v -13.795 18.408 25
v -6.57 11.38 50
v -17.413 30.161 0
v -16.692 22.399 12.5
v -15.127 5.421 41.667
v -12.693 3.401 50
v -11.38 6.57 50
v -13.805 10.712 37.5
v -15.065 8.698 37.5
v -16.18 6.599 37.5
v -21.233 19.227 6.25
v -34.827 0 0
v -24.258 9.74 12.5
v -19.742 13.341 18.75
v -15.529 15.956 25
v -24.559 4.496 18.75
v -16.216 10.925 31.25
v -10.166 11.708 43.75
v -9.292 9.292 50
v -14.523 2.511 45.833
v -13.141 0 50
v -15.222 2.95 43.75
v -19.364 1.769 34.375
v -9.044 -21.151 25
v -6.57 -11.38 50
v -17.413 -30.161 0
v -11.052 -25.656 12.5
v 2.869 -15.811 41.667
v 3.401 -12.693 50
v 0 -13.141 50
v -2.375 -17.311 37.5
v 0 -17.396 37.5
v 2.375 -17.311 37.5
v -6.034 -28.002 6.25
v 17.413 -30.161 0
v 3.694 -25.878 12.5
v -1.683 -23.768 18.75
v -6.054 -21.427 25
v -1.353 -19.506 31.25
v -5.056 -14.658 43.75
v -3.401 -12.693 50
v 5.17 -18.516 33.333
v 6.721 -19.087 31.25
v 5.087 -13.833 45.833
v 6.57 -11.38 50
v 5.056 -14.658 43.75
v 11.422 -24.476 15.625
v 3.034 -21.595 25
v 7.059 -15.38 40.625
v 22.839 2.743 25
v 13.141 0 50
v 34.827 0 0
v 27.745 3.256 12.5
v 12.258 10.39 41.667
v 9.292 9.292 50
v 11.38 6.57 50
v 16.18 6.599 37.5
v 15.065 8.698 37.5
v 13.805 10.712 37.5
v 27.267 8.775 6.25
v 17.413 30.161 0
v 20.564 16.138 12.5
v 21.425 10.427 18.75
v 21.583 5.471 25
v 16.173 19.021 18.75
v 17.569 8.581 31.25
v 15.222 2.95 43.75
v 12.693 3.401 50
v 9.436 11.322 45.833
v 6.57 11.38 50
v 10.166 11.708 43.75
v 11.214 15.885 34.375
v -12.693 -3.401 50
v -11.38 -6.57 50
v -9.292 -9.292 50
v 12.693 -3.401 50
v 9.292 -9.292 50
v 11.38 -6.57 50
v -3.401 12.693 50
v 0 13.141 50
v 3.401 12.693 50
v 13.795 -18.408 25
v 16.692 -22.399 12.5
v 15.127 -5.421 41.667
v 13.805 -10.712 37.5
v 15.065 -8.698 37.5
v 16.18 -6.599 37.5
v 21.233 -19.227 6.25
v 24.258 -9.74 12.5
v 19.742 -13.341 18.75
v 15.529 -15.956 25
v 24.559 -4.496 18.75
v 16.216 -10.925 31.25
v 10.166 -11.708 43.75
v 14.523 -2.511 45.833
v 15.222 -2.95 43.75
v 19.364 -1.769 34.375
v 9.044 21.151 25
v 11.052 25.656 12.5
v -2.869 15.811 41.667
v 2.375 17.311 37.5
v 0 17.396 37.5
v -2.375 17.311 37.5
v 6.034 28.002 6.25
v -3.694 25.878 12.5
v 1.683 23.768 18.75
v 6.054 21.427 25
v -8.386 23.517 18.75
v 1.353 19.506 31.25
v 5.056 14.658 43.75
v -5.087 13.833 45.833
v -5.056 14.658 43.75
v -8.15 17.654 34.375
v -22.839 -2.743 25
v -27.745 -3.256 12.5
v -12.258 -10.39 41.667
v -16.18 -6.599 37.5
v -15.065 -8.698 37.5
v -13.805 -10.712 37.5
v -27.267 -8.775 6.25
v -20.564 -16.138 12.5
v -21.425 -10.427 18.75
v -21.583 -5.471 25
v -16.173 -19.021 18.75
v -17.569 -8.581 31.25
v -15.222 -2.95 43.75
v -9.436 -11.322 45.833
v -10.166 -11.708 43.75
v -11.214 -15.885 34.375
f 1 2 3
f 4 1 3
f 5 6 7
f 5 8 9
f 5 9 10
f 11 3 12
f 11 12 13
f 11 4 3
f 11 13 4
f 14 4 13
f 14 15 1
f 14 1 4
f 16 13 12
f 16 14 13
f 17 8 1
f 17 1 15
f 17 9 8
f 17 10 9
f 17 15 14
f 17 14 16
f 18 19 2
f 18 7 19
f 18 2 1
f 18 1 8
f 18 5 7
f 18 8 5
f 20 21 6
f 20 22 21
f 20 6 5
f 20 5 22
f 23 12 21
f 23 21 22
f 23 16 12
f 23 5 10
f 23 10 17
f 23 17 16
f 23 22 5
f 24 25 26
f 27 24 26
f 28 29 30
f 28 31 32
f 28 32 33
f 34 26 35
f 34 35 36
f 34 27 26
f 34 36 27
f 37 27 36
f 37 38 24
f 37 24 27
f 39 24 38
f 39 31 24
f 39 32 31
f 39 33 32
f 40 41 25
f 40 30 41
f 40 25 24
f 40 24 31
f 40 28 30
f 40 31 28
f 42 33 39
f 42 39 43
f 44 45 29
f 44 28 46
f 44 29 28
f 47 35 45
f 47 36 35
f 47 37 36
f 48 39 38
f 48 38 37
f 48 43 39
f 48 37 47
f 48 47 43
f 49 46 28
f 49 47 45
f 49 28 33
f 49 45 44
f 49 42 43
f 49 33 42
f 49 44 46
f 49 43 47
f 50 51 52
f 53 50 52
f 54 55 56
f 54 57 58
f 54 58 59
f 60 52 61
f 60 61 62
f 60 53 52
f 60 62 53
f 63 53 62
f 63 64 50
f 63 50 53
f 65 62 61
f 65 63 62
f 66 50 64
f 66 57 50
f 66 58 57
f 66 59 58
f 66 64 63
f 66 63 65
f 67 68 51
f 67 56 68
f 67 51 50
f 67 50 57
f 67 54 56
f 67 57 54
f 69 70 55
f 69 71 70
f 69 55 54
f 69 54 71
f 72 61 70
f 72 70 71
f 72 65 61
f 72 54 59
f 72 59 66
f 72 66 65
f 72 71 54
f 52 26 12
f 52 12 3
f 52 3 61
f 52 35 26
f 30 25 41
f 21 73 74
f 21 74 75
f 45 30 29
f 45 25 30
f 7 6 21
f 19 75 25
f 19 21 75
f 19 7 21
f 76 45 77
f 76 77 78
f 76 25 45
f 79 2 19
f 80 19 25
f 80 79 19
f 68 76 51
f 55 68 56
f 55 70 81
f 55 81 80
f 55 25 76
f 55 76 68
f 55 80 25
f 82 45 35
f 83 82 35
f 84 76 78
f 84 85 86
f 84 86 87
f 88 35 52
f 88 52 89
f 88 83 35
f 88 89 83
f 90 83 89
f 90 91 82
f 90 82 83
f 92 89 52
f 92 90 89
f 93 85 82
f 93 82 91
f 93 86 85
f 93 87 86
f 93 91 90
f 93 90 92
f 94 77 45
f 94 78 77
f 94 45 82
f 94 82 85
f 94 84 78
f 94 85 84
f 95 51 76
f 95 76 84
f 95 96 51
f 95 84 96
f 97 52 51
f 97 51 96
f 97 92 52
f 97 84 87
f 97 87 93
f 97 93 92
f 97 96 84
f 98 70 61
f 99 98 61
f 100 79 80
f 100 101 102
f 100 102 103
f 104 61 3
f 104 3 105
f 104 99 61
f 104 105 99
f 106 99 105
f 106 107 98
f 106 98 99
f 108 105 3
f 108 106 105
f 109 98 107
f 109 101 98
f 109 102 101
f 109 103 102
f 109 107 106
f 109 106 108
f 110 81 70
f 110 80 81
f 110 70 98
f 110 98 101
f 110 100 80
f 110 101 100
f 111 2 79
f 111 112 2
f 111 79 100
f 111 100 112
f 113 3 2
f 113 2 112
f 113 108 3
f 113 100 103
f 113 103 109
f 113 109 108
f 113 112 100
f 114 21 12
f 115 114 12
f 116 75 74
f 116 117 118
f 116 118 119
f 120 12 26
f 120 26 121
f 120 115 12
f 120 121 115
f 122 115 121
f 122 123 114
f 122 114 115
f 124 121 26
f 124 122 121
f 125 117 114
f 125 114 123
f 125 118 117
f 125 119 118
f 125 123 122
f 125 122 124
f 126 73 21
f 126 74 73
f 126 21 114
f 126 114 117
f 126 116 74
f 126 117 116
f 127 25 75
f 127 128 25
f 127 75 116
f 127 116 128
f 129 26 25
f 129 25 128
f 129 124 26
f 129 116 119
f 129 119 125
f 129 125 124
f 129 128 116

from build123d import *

# Parameters (mm, degrees)
F2_R = 13.140727


with BuildPart() as f3:
    # F0 (on Top) → F3 section 0
    with BuildSketch(Plane.XY):
        Polygon((-17.413452, -30.160984), (17.413452, -30.160984), (34.826904, 0), (17.413452, 30.160984), (-17.413452, 30.160984), (-34.826904, 0), align=None)
    # F2 (on offset) → F3 section 1
    with BuildSketch(Plane.XY.offset(50)):
        Circle(F2_R)
    loft()


solid = f3.part
